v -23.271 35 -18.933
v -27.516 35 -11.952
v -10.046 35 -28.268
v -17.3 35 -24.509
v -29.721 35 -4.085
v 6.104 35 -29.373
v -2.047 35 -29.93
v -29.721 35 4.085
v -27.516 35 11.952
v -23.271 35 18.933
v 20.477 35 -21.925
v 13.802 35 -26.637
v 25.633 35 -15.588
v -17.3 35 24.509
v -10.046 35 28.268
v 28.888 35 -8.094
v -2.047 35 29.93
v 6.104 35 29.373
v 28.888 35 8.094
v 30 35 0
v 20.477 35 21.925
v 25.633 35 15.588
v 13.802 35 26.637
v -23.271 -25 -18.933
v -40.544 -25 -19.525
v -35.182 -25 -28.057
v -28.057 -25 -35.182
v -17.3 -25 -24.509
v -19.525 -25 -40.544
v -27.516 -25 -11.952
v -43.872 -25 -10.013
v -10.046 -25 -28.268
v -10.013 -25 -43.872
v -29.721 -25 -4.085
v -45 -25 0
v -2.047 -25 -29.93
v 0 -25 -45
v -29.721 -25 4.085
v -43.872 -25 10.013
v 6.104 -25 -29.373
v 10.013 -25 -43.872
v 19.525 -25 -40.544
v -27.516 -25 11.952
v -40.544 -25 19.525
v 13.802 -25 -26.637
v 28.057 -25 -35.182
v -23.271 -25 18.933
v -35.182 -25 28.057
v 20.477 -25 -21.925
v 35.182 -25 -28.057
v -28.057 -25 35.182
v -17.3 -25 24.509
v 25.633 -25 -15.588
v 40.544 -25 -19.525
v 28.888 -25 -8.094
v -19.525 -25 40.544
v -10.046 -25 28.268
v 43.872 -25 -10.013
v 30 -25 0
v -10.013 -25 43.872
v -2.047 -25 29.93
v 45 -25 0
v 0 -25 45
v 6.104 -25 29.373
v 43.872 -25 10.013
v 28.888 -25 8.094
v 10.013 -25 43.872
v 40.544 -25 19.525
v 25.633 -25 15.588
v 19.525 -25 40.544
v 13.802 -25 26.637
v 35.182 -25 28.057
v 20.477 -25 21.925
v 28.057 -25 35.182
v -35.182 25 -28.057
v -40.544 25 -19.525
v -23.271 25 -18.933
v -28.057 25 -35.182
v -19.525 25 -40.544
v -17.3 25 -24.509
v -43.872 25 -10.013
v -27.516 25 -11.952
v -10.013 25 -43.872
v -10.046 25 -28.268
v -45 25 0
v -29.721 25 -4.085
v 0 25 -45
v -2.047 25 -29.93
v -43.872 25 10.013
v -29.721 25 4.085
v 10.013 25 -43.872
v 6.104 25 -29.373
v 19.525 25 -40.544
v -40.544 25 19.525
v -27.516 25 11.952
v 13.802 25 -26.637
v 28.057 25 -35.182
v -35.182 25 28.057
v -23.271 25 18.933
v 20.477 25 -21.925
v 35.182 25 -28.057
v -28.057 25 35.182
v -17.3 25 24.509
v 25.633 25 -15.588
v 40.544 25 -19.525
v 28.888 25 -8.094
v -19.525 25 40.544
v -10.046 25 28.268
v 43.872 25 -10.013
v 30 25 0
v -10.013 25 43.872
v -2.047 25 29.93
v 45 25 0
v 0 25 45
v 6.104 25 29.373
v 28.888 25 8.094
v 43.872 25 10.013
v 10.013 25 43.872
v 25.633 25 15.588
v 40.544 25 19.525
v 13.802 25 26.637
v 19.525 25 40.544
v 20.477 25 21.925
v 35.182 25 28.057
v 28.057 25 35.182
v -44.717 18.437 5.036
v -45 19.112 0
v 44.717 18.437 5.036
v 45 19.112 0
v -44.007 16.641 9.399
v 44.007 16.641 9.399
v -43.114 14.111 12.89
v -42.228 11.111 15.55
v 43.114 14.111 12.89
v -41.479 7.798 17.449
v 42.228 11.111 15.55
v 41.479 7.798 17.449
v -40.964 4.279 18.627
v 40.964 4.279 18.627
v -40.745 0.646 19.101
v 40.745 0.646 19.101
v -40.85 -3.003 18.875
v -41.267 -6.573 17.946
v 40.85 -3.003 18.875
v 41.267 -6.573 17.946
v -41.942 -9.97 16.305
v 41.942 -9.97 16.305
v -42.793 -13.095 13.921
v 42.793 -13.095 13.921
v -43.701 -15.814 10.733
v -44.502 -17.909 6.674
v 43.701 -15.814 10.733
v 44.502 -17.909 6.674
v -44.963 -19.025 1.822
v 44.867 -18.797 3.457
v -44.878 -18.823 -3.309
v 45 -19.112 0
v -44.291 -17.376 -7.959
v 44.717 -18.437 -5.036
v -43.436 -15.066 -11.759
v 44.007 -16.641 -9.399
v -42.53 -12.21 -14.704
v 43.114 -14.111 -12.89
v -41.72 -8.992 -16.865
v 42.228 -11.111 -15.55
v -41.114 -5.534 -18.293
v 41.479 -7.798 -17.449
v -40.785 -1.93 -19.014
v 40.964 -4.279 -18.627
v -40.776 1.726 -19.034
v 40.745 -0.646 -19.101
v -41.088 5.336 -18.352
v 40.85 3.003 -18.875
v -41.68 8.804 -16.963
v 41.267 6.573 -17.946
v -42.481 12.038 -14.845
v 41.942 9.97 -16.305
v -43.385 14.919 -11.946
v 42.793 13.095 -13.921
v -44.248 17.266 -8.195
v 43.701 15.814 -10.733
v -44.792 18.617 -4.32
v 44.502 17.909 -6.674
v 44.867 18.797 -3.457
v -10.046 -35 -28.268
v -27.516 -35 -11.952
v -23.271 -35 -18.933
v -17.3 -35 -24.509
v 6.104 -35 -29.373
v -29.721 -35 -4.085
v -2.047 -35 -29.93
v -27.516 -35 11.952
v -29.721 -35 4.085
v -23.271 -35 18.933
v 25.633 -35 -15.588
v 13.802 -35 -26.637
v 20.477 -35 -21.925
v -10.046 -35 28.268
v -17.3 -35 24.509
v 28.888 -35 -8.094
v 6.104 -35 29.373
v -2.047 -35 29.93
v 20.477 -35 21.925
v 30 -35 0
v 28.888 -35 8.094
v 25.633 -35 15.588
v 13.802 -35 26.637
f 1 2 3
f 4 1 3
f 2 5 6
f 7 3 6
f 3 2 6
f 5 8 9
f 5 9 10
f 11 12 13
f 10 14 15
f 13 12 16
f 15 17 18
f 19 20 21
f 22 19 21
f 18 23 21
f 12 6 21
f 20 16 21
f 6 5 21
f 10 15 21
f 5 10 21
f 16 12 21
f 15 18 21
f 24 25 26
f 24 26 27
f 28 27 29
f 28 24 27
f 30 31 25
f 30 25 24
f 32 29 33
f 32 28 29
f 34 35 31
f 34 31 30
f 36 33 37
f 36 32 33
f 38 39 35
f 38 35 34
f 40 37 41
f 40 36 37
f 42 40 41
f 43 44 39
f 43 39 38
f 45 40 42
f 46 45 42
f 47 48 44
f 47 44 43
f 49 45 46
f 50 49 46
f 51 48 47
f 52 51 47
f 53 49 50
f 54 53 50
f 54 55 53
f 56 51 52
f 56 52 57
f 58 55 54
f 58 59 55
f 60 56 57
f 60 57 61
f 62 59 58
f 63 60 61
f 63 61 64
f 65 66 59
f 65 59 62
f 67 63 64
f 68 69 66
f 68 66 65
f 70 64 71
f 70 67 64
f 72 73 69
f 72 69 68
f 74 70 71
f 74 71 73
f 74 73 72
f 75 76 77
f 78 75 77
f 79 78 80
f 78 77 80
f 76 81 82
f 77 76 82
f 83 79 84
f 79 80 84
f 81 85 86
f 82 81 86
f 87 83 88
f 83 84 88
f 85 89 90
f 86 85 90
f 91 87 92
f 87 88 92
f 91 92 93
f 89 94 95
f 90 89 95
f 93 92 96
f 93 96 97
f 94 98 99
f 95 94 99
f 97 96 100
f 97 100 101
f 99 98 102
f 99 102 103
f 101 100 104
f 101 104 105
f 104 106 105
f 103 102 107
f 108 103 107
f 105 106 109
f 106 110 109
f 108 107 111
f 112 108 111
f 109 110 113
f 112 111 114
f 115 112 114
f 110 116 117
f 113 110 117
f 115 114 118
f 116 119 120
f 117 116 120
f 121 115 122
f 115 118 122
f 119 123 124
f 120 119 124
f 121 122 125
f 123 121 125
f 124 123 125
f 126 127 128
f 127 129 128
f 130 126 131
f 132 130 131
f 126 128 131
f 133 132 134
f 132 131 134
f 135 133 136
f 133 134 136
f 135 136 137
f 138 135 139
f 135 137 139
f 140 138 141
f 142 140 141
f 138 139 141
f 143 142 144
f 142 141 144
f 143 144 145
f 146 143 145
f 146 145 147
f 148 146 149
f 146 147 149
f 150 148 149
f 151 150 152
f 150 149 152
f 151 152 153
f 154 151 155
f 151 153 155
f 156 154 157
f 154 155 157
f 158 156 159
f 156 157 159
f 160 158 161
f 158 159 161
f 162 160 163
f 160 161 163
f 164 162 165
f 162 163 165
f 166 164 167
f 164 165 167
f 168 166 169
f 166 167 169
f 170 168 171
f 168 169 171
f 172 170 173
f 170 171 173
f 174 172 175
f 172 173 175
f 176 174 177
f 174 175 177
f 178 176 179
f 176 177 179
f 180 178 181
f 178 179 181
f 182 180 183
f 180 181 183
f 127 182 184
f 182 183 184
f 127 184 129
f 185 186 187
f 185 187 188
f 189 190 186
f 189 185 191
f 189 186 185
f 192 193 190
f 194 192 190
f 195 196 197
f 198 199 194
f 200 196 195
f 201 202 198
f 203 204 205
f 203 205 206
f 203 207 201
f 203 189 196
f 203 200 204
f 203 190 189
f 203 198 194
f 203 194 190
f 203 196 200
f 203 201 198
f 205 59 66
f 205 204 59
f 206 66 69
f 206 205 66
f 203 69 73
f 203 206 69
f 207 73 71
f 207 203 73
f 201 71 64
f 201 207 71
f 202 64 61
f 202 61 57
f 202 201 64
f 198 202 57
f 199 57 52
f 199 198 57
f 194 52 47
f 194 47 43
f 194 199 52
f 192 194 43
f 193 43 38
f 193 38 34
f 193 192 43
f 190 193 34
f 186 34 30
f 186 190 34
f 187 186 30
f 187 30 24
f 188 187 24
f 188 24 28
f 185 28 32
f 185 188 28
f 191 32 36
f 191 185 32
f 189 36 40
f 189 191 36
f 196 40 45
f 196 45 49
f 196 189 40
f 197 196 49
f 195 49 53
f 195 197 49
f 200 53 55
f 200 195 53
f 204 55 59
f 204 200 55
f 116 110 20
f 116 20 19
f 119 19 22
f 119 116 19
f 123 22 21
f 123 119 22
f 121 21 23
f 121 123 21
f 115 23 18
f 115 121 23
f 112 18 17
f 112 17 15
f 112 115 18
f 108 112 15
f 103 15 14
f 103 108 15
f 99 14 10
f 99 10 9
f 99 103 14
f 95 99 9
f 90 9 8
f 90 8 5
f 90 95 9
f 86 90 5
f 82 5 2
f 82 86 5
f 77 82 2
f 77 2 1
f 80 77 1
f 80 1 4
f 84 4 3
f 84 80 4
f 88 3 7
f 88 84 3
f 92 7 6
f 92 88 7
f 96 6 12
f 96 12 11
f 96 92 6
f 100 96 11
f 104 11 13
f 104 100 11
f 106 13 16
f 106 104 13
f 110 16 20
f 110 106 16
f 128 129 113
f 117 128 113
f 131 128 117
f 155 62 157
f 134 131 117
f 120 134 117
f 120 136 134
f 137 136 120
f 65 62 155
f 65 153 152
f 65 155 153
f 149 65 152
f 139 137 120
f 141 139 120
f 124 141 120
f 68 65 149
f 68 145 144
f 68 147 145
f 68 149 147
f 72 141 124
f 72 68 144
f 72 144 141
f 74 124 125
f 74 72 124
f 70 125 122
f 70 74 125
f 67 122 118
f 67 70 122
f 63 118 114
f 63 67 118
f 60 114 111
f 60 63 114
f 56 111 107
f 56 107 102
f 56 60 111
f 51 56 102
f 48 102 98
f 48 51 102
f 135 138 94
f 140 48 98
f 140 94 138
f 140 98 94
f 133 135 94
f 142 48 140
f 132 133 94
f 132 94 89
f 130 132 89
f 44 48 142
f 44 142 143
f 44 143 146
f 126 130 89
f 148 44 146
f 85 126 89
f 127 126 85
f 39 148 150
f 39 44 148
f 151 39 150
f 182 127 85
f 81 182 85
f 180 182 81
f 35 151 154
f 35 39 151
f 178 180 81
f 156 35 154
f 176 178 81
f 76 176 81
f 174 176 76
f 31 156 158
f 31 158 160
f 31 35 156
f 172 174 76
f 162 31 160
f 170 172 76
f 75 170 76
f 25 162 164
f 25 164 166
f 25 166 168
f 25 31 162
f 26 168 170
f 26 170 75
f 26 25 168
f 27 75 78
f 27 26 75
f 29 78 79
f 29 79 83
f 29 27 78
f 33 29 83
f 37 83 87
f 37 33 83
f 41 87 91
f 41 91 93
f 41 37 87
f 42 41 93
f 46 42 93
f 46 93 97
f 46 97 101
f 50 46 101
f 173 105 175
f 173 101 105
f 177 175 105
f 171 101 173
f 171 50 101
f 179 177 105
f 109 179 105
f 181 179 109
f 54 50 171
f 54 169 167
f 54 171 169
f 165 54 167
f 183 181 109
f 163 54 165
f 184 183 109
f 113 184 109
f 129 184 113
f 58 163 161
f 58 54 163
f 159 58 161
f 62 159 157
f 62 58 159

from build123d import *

# Parameters (mm, degrees)
F0_R     = 30
F1_DEPTH = 35
F0_R_2   = 45
F2_DEPTH = 25
F3_R     = 19.112105
F4_DEPTH = 45


with BuildPart() as f1:
    # F0 (on Front) → F1 (new body, symmetric)
    with BuildSketch(Plane.XZ):
        Circle(F0_R)
    extrude(amount=F1_DEPTH, both=True)

    # F0 (on Front) → F2 (join, symmetric)
    with BuildSketch(Plane.XZ):
        Circle(F0_R_2)
        Circle(F0_R, mode=Mode.SUBTRACT)
    extrude(amount=F2_DEPTH, both=True)

    # F3 (on Right) → F4 (cut, symmetric)
    with BuildSketch(Plane.YZ):
        Circle(F3_R)
    extrude(amount=F4_DEPTH, both=True, mode=Mode.SUBTRACT)


solid = f1.part
